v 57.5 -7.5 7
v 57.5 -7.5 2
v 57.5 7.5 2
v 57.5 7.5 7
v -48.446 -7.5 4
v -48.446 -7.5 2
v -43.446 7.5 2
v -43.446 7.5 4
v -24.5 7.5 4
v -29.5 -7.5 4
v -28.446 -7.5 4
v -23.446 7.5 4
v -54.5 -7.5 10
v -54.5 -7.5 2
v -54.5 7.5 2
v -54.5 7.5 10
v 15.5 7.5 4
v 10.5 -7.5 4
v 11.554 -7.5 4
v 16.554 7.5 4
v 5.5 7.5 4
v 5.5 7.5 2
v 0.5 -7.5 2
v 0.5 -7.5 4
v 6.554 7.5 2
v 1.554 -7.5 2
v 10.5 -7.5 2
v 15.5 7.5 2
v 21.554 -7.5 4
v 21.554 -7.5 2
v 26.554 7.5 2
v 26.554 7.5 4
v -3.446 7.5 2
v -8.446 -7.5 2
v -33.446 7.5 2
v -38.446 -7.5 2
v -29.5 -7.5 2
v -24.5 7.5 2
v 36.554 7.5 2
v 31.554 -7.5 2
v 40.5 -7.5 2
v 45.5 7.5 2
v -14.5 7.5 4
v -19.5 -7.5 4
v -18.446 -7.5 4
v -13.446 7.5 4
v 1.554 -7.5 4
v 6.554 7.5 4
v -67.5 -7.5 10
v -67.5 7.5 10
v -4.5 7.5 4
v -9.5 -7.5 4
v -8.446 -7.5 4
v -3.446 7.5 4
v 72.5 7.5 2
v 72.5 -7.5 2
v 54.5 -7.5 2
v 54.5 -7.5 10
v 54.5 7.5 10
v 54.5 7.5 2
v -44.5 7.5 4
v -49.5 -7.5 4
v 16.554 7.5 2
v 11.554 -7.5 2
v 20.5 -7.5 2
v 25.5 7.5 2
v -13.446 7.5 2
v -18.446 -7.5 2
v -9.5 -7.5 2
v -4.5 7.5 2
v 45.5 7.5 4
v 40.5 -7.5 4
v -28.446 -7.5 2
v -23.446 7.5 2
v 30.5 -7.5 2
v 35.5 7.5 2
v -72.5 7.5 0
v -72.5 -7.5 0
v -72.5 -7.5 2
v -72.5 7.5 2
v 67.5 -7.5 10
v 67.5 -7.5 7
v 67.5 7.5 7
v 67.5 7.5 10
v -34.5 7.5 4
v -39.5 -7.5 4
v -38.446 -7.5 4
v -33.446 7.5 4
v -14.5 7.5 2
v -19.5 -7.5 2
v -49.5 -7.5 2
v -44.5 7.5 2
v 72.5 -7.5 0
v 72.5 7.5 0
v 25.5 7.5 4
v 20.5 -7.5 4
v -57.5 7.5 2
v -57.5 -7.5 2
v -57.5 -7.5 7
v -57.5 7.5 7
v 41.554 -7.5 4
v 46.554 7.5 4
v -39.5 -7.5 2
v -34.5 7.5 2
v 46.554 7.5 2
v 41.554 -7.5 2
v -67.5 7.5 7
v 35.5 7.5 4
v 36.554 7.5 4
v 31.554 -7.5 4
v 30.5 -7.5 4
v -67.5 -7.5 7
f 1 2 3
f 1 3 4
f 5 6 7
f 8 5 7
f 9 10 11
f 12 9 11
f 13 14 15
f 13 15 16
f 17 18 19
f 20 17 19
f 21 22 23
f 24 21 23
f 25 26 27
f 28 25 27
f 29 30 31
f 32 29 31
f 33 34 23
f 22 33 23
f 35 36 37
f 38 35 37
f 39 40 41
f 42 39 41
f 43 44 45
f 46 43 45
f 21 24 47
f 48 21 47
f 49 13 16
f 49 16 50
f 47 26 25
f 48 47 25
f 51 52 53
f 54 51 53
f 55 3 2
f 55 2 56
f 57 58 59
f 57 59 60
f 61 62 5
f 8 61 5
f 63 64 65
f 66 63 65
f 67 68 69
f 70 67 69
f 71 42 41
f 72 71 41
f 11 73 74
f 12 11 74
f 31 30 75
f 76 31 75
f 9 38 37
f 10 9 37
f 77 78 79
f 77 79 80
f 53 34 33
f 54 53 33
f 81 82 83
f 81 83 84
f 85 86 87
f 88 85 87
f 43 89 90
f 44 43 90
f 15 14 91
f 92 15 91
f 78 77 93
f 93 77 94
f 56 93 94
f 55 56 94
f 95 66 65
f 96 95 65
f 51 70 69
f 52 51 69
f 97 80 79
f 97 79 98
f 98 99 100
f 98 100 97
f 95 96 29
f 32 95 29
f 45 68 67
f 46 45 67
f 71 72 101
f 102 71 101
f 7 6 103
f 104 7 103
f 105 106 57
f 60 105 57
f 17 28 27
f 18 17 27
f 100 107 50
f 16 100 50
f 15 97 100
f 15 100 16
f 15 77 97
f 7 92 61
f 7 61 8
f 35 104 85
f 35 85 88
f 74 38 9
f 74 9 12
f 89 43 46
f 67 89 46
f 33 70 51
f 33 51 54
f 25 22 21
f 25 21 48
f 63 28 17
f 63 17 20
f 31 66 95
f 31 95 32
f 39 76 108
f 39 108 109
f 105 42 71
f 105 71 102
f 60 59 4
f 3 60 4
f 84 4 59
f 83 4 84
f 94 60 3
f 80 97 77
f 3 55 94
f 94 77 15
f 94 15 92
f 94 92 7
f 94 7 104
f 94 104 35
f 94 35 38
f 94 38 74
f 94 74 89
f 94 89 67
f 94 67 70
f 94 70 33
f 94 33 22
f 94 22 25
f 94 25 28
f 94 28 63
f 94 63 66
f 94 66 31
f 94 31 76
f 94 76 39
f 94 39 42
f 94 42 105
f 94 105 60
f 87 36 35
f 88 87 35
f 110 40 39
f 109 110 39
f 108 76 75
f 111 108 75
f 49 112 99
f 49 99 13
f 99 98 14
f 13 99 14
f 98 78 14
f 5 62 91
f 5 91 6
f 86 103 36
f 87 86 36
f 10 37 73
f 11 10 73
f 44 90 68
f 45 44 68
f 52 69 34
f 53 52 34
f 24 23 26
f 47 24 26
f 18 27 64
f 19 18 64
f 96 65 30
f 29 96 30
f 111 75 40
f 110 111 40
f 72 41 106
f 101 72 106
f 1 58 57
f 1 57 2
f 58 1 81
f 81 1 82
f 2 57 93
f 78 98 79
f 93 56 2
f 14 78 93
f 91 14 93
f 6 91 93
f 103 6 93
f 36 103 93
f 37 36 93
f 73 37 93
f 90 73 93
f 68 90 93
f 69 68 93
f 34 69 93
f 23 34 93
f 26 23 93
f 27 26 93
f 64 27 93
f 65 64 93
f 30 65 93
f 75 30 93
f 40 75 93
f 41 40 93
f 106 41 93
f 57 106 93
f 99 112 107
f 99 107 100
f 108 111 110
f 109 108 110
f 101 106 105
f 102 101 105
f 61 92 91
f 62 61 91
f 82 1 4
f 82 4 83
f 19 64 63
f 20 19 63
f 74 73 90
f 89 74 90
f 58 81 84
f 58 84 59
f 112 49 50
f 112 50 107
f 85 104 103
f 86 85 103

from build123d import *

# Parameters (mm, degrees)
F0_W     = 145
F0_H     = 15
F1_DEPTH = 2
F3_DEPTH = 15
F5_DEPTH = 2


with BuildPart() as f1:
    # F0 (on Top) → F1 (new body)
    with BuildSketch(Plane.XY):
        Rectangle(F0_W, F0_H)
    extrude(amount=F1_DEPTH)

    # F2 (on face) → F3 (join, through all)
    with BuildSketch(Plane.XZ.offset(7.5)):
        Polygon((-57.5, 7), (-57.5, 2), (-54.5, 2), (-54.5, 10), (-67.5, 10), (-67.5, 7), align=None)
        Polygon((57.5, 7), (67.5, 7), (67.5, 10), (54.5, 10), (54.5, 2), (57.5, 2), align=None)
    extrude(amount=-F3_DEPTH)

    # F4 (on face) → F5 (join)
    with BuildSketch(Plane.XY.offset(2)):
        Polygon((-44.5, 7.5), (-49.5, -7.5), (-48.445907, -7.5), (-43.445907, 7.5), align=None)
        Polygon((-34.5, 7.5), (-39.5, -7.5), (-38.445907, -7.5), (-33.445907, 7.5), align=None)
        Polygon((-24.5, 7.5), (-29.5, -7.5), (-28.445907, -7.5), (-23.445907, 7.5), align=None)
        Polygon((-14.5, 7.5), (-19.5, -7.5), (-18.445907, -7.5), (-13.445907, 7.5), align=None)
        Polygon((-4.5, 7.5), (-9.5, -7.5), (-8.445907, -7.5), (-3.445907, 7.5), align=None)
        Polygon((5.5, 7.5), (0.5, -7.5), (1.554093, -7.5), (6.554093, 7.5), align=None)
        Polygon((15.5, 7.5), (10.5, -7.5), (11.554093, -7.5), (16.554093, 7.5), align=None)
        Polygon((25.5, 7.5), (20.5, -7.5), (21.554093, -7.5), (26.554093, 7.5), align=None)
        Polygon((35.5, 7.5), (30.5, -7.5), (31.554093, -7.5), (36.554093, 7.5), align=None)
        Polygon((45.5, 7.5), (40.5, -7.5), (41.554093, -7.5), (46.554093, 7.5), align=None)
    extrude(amount=F5_DEPTH)


solid = f1.part
